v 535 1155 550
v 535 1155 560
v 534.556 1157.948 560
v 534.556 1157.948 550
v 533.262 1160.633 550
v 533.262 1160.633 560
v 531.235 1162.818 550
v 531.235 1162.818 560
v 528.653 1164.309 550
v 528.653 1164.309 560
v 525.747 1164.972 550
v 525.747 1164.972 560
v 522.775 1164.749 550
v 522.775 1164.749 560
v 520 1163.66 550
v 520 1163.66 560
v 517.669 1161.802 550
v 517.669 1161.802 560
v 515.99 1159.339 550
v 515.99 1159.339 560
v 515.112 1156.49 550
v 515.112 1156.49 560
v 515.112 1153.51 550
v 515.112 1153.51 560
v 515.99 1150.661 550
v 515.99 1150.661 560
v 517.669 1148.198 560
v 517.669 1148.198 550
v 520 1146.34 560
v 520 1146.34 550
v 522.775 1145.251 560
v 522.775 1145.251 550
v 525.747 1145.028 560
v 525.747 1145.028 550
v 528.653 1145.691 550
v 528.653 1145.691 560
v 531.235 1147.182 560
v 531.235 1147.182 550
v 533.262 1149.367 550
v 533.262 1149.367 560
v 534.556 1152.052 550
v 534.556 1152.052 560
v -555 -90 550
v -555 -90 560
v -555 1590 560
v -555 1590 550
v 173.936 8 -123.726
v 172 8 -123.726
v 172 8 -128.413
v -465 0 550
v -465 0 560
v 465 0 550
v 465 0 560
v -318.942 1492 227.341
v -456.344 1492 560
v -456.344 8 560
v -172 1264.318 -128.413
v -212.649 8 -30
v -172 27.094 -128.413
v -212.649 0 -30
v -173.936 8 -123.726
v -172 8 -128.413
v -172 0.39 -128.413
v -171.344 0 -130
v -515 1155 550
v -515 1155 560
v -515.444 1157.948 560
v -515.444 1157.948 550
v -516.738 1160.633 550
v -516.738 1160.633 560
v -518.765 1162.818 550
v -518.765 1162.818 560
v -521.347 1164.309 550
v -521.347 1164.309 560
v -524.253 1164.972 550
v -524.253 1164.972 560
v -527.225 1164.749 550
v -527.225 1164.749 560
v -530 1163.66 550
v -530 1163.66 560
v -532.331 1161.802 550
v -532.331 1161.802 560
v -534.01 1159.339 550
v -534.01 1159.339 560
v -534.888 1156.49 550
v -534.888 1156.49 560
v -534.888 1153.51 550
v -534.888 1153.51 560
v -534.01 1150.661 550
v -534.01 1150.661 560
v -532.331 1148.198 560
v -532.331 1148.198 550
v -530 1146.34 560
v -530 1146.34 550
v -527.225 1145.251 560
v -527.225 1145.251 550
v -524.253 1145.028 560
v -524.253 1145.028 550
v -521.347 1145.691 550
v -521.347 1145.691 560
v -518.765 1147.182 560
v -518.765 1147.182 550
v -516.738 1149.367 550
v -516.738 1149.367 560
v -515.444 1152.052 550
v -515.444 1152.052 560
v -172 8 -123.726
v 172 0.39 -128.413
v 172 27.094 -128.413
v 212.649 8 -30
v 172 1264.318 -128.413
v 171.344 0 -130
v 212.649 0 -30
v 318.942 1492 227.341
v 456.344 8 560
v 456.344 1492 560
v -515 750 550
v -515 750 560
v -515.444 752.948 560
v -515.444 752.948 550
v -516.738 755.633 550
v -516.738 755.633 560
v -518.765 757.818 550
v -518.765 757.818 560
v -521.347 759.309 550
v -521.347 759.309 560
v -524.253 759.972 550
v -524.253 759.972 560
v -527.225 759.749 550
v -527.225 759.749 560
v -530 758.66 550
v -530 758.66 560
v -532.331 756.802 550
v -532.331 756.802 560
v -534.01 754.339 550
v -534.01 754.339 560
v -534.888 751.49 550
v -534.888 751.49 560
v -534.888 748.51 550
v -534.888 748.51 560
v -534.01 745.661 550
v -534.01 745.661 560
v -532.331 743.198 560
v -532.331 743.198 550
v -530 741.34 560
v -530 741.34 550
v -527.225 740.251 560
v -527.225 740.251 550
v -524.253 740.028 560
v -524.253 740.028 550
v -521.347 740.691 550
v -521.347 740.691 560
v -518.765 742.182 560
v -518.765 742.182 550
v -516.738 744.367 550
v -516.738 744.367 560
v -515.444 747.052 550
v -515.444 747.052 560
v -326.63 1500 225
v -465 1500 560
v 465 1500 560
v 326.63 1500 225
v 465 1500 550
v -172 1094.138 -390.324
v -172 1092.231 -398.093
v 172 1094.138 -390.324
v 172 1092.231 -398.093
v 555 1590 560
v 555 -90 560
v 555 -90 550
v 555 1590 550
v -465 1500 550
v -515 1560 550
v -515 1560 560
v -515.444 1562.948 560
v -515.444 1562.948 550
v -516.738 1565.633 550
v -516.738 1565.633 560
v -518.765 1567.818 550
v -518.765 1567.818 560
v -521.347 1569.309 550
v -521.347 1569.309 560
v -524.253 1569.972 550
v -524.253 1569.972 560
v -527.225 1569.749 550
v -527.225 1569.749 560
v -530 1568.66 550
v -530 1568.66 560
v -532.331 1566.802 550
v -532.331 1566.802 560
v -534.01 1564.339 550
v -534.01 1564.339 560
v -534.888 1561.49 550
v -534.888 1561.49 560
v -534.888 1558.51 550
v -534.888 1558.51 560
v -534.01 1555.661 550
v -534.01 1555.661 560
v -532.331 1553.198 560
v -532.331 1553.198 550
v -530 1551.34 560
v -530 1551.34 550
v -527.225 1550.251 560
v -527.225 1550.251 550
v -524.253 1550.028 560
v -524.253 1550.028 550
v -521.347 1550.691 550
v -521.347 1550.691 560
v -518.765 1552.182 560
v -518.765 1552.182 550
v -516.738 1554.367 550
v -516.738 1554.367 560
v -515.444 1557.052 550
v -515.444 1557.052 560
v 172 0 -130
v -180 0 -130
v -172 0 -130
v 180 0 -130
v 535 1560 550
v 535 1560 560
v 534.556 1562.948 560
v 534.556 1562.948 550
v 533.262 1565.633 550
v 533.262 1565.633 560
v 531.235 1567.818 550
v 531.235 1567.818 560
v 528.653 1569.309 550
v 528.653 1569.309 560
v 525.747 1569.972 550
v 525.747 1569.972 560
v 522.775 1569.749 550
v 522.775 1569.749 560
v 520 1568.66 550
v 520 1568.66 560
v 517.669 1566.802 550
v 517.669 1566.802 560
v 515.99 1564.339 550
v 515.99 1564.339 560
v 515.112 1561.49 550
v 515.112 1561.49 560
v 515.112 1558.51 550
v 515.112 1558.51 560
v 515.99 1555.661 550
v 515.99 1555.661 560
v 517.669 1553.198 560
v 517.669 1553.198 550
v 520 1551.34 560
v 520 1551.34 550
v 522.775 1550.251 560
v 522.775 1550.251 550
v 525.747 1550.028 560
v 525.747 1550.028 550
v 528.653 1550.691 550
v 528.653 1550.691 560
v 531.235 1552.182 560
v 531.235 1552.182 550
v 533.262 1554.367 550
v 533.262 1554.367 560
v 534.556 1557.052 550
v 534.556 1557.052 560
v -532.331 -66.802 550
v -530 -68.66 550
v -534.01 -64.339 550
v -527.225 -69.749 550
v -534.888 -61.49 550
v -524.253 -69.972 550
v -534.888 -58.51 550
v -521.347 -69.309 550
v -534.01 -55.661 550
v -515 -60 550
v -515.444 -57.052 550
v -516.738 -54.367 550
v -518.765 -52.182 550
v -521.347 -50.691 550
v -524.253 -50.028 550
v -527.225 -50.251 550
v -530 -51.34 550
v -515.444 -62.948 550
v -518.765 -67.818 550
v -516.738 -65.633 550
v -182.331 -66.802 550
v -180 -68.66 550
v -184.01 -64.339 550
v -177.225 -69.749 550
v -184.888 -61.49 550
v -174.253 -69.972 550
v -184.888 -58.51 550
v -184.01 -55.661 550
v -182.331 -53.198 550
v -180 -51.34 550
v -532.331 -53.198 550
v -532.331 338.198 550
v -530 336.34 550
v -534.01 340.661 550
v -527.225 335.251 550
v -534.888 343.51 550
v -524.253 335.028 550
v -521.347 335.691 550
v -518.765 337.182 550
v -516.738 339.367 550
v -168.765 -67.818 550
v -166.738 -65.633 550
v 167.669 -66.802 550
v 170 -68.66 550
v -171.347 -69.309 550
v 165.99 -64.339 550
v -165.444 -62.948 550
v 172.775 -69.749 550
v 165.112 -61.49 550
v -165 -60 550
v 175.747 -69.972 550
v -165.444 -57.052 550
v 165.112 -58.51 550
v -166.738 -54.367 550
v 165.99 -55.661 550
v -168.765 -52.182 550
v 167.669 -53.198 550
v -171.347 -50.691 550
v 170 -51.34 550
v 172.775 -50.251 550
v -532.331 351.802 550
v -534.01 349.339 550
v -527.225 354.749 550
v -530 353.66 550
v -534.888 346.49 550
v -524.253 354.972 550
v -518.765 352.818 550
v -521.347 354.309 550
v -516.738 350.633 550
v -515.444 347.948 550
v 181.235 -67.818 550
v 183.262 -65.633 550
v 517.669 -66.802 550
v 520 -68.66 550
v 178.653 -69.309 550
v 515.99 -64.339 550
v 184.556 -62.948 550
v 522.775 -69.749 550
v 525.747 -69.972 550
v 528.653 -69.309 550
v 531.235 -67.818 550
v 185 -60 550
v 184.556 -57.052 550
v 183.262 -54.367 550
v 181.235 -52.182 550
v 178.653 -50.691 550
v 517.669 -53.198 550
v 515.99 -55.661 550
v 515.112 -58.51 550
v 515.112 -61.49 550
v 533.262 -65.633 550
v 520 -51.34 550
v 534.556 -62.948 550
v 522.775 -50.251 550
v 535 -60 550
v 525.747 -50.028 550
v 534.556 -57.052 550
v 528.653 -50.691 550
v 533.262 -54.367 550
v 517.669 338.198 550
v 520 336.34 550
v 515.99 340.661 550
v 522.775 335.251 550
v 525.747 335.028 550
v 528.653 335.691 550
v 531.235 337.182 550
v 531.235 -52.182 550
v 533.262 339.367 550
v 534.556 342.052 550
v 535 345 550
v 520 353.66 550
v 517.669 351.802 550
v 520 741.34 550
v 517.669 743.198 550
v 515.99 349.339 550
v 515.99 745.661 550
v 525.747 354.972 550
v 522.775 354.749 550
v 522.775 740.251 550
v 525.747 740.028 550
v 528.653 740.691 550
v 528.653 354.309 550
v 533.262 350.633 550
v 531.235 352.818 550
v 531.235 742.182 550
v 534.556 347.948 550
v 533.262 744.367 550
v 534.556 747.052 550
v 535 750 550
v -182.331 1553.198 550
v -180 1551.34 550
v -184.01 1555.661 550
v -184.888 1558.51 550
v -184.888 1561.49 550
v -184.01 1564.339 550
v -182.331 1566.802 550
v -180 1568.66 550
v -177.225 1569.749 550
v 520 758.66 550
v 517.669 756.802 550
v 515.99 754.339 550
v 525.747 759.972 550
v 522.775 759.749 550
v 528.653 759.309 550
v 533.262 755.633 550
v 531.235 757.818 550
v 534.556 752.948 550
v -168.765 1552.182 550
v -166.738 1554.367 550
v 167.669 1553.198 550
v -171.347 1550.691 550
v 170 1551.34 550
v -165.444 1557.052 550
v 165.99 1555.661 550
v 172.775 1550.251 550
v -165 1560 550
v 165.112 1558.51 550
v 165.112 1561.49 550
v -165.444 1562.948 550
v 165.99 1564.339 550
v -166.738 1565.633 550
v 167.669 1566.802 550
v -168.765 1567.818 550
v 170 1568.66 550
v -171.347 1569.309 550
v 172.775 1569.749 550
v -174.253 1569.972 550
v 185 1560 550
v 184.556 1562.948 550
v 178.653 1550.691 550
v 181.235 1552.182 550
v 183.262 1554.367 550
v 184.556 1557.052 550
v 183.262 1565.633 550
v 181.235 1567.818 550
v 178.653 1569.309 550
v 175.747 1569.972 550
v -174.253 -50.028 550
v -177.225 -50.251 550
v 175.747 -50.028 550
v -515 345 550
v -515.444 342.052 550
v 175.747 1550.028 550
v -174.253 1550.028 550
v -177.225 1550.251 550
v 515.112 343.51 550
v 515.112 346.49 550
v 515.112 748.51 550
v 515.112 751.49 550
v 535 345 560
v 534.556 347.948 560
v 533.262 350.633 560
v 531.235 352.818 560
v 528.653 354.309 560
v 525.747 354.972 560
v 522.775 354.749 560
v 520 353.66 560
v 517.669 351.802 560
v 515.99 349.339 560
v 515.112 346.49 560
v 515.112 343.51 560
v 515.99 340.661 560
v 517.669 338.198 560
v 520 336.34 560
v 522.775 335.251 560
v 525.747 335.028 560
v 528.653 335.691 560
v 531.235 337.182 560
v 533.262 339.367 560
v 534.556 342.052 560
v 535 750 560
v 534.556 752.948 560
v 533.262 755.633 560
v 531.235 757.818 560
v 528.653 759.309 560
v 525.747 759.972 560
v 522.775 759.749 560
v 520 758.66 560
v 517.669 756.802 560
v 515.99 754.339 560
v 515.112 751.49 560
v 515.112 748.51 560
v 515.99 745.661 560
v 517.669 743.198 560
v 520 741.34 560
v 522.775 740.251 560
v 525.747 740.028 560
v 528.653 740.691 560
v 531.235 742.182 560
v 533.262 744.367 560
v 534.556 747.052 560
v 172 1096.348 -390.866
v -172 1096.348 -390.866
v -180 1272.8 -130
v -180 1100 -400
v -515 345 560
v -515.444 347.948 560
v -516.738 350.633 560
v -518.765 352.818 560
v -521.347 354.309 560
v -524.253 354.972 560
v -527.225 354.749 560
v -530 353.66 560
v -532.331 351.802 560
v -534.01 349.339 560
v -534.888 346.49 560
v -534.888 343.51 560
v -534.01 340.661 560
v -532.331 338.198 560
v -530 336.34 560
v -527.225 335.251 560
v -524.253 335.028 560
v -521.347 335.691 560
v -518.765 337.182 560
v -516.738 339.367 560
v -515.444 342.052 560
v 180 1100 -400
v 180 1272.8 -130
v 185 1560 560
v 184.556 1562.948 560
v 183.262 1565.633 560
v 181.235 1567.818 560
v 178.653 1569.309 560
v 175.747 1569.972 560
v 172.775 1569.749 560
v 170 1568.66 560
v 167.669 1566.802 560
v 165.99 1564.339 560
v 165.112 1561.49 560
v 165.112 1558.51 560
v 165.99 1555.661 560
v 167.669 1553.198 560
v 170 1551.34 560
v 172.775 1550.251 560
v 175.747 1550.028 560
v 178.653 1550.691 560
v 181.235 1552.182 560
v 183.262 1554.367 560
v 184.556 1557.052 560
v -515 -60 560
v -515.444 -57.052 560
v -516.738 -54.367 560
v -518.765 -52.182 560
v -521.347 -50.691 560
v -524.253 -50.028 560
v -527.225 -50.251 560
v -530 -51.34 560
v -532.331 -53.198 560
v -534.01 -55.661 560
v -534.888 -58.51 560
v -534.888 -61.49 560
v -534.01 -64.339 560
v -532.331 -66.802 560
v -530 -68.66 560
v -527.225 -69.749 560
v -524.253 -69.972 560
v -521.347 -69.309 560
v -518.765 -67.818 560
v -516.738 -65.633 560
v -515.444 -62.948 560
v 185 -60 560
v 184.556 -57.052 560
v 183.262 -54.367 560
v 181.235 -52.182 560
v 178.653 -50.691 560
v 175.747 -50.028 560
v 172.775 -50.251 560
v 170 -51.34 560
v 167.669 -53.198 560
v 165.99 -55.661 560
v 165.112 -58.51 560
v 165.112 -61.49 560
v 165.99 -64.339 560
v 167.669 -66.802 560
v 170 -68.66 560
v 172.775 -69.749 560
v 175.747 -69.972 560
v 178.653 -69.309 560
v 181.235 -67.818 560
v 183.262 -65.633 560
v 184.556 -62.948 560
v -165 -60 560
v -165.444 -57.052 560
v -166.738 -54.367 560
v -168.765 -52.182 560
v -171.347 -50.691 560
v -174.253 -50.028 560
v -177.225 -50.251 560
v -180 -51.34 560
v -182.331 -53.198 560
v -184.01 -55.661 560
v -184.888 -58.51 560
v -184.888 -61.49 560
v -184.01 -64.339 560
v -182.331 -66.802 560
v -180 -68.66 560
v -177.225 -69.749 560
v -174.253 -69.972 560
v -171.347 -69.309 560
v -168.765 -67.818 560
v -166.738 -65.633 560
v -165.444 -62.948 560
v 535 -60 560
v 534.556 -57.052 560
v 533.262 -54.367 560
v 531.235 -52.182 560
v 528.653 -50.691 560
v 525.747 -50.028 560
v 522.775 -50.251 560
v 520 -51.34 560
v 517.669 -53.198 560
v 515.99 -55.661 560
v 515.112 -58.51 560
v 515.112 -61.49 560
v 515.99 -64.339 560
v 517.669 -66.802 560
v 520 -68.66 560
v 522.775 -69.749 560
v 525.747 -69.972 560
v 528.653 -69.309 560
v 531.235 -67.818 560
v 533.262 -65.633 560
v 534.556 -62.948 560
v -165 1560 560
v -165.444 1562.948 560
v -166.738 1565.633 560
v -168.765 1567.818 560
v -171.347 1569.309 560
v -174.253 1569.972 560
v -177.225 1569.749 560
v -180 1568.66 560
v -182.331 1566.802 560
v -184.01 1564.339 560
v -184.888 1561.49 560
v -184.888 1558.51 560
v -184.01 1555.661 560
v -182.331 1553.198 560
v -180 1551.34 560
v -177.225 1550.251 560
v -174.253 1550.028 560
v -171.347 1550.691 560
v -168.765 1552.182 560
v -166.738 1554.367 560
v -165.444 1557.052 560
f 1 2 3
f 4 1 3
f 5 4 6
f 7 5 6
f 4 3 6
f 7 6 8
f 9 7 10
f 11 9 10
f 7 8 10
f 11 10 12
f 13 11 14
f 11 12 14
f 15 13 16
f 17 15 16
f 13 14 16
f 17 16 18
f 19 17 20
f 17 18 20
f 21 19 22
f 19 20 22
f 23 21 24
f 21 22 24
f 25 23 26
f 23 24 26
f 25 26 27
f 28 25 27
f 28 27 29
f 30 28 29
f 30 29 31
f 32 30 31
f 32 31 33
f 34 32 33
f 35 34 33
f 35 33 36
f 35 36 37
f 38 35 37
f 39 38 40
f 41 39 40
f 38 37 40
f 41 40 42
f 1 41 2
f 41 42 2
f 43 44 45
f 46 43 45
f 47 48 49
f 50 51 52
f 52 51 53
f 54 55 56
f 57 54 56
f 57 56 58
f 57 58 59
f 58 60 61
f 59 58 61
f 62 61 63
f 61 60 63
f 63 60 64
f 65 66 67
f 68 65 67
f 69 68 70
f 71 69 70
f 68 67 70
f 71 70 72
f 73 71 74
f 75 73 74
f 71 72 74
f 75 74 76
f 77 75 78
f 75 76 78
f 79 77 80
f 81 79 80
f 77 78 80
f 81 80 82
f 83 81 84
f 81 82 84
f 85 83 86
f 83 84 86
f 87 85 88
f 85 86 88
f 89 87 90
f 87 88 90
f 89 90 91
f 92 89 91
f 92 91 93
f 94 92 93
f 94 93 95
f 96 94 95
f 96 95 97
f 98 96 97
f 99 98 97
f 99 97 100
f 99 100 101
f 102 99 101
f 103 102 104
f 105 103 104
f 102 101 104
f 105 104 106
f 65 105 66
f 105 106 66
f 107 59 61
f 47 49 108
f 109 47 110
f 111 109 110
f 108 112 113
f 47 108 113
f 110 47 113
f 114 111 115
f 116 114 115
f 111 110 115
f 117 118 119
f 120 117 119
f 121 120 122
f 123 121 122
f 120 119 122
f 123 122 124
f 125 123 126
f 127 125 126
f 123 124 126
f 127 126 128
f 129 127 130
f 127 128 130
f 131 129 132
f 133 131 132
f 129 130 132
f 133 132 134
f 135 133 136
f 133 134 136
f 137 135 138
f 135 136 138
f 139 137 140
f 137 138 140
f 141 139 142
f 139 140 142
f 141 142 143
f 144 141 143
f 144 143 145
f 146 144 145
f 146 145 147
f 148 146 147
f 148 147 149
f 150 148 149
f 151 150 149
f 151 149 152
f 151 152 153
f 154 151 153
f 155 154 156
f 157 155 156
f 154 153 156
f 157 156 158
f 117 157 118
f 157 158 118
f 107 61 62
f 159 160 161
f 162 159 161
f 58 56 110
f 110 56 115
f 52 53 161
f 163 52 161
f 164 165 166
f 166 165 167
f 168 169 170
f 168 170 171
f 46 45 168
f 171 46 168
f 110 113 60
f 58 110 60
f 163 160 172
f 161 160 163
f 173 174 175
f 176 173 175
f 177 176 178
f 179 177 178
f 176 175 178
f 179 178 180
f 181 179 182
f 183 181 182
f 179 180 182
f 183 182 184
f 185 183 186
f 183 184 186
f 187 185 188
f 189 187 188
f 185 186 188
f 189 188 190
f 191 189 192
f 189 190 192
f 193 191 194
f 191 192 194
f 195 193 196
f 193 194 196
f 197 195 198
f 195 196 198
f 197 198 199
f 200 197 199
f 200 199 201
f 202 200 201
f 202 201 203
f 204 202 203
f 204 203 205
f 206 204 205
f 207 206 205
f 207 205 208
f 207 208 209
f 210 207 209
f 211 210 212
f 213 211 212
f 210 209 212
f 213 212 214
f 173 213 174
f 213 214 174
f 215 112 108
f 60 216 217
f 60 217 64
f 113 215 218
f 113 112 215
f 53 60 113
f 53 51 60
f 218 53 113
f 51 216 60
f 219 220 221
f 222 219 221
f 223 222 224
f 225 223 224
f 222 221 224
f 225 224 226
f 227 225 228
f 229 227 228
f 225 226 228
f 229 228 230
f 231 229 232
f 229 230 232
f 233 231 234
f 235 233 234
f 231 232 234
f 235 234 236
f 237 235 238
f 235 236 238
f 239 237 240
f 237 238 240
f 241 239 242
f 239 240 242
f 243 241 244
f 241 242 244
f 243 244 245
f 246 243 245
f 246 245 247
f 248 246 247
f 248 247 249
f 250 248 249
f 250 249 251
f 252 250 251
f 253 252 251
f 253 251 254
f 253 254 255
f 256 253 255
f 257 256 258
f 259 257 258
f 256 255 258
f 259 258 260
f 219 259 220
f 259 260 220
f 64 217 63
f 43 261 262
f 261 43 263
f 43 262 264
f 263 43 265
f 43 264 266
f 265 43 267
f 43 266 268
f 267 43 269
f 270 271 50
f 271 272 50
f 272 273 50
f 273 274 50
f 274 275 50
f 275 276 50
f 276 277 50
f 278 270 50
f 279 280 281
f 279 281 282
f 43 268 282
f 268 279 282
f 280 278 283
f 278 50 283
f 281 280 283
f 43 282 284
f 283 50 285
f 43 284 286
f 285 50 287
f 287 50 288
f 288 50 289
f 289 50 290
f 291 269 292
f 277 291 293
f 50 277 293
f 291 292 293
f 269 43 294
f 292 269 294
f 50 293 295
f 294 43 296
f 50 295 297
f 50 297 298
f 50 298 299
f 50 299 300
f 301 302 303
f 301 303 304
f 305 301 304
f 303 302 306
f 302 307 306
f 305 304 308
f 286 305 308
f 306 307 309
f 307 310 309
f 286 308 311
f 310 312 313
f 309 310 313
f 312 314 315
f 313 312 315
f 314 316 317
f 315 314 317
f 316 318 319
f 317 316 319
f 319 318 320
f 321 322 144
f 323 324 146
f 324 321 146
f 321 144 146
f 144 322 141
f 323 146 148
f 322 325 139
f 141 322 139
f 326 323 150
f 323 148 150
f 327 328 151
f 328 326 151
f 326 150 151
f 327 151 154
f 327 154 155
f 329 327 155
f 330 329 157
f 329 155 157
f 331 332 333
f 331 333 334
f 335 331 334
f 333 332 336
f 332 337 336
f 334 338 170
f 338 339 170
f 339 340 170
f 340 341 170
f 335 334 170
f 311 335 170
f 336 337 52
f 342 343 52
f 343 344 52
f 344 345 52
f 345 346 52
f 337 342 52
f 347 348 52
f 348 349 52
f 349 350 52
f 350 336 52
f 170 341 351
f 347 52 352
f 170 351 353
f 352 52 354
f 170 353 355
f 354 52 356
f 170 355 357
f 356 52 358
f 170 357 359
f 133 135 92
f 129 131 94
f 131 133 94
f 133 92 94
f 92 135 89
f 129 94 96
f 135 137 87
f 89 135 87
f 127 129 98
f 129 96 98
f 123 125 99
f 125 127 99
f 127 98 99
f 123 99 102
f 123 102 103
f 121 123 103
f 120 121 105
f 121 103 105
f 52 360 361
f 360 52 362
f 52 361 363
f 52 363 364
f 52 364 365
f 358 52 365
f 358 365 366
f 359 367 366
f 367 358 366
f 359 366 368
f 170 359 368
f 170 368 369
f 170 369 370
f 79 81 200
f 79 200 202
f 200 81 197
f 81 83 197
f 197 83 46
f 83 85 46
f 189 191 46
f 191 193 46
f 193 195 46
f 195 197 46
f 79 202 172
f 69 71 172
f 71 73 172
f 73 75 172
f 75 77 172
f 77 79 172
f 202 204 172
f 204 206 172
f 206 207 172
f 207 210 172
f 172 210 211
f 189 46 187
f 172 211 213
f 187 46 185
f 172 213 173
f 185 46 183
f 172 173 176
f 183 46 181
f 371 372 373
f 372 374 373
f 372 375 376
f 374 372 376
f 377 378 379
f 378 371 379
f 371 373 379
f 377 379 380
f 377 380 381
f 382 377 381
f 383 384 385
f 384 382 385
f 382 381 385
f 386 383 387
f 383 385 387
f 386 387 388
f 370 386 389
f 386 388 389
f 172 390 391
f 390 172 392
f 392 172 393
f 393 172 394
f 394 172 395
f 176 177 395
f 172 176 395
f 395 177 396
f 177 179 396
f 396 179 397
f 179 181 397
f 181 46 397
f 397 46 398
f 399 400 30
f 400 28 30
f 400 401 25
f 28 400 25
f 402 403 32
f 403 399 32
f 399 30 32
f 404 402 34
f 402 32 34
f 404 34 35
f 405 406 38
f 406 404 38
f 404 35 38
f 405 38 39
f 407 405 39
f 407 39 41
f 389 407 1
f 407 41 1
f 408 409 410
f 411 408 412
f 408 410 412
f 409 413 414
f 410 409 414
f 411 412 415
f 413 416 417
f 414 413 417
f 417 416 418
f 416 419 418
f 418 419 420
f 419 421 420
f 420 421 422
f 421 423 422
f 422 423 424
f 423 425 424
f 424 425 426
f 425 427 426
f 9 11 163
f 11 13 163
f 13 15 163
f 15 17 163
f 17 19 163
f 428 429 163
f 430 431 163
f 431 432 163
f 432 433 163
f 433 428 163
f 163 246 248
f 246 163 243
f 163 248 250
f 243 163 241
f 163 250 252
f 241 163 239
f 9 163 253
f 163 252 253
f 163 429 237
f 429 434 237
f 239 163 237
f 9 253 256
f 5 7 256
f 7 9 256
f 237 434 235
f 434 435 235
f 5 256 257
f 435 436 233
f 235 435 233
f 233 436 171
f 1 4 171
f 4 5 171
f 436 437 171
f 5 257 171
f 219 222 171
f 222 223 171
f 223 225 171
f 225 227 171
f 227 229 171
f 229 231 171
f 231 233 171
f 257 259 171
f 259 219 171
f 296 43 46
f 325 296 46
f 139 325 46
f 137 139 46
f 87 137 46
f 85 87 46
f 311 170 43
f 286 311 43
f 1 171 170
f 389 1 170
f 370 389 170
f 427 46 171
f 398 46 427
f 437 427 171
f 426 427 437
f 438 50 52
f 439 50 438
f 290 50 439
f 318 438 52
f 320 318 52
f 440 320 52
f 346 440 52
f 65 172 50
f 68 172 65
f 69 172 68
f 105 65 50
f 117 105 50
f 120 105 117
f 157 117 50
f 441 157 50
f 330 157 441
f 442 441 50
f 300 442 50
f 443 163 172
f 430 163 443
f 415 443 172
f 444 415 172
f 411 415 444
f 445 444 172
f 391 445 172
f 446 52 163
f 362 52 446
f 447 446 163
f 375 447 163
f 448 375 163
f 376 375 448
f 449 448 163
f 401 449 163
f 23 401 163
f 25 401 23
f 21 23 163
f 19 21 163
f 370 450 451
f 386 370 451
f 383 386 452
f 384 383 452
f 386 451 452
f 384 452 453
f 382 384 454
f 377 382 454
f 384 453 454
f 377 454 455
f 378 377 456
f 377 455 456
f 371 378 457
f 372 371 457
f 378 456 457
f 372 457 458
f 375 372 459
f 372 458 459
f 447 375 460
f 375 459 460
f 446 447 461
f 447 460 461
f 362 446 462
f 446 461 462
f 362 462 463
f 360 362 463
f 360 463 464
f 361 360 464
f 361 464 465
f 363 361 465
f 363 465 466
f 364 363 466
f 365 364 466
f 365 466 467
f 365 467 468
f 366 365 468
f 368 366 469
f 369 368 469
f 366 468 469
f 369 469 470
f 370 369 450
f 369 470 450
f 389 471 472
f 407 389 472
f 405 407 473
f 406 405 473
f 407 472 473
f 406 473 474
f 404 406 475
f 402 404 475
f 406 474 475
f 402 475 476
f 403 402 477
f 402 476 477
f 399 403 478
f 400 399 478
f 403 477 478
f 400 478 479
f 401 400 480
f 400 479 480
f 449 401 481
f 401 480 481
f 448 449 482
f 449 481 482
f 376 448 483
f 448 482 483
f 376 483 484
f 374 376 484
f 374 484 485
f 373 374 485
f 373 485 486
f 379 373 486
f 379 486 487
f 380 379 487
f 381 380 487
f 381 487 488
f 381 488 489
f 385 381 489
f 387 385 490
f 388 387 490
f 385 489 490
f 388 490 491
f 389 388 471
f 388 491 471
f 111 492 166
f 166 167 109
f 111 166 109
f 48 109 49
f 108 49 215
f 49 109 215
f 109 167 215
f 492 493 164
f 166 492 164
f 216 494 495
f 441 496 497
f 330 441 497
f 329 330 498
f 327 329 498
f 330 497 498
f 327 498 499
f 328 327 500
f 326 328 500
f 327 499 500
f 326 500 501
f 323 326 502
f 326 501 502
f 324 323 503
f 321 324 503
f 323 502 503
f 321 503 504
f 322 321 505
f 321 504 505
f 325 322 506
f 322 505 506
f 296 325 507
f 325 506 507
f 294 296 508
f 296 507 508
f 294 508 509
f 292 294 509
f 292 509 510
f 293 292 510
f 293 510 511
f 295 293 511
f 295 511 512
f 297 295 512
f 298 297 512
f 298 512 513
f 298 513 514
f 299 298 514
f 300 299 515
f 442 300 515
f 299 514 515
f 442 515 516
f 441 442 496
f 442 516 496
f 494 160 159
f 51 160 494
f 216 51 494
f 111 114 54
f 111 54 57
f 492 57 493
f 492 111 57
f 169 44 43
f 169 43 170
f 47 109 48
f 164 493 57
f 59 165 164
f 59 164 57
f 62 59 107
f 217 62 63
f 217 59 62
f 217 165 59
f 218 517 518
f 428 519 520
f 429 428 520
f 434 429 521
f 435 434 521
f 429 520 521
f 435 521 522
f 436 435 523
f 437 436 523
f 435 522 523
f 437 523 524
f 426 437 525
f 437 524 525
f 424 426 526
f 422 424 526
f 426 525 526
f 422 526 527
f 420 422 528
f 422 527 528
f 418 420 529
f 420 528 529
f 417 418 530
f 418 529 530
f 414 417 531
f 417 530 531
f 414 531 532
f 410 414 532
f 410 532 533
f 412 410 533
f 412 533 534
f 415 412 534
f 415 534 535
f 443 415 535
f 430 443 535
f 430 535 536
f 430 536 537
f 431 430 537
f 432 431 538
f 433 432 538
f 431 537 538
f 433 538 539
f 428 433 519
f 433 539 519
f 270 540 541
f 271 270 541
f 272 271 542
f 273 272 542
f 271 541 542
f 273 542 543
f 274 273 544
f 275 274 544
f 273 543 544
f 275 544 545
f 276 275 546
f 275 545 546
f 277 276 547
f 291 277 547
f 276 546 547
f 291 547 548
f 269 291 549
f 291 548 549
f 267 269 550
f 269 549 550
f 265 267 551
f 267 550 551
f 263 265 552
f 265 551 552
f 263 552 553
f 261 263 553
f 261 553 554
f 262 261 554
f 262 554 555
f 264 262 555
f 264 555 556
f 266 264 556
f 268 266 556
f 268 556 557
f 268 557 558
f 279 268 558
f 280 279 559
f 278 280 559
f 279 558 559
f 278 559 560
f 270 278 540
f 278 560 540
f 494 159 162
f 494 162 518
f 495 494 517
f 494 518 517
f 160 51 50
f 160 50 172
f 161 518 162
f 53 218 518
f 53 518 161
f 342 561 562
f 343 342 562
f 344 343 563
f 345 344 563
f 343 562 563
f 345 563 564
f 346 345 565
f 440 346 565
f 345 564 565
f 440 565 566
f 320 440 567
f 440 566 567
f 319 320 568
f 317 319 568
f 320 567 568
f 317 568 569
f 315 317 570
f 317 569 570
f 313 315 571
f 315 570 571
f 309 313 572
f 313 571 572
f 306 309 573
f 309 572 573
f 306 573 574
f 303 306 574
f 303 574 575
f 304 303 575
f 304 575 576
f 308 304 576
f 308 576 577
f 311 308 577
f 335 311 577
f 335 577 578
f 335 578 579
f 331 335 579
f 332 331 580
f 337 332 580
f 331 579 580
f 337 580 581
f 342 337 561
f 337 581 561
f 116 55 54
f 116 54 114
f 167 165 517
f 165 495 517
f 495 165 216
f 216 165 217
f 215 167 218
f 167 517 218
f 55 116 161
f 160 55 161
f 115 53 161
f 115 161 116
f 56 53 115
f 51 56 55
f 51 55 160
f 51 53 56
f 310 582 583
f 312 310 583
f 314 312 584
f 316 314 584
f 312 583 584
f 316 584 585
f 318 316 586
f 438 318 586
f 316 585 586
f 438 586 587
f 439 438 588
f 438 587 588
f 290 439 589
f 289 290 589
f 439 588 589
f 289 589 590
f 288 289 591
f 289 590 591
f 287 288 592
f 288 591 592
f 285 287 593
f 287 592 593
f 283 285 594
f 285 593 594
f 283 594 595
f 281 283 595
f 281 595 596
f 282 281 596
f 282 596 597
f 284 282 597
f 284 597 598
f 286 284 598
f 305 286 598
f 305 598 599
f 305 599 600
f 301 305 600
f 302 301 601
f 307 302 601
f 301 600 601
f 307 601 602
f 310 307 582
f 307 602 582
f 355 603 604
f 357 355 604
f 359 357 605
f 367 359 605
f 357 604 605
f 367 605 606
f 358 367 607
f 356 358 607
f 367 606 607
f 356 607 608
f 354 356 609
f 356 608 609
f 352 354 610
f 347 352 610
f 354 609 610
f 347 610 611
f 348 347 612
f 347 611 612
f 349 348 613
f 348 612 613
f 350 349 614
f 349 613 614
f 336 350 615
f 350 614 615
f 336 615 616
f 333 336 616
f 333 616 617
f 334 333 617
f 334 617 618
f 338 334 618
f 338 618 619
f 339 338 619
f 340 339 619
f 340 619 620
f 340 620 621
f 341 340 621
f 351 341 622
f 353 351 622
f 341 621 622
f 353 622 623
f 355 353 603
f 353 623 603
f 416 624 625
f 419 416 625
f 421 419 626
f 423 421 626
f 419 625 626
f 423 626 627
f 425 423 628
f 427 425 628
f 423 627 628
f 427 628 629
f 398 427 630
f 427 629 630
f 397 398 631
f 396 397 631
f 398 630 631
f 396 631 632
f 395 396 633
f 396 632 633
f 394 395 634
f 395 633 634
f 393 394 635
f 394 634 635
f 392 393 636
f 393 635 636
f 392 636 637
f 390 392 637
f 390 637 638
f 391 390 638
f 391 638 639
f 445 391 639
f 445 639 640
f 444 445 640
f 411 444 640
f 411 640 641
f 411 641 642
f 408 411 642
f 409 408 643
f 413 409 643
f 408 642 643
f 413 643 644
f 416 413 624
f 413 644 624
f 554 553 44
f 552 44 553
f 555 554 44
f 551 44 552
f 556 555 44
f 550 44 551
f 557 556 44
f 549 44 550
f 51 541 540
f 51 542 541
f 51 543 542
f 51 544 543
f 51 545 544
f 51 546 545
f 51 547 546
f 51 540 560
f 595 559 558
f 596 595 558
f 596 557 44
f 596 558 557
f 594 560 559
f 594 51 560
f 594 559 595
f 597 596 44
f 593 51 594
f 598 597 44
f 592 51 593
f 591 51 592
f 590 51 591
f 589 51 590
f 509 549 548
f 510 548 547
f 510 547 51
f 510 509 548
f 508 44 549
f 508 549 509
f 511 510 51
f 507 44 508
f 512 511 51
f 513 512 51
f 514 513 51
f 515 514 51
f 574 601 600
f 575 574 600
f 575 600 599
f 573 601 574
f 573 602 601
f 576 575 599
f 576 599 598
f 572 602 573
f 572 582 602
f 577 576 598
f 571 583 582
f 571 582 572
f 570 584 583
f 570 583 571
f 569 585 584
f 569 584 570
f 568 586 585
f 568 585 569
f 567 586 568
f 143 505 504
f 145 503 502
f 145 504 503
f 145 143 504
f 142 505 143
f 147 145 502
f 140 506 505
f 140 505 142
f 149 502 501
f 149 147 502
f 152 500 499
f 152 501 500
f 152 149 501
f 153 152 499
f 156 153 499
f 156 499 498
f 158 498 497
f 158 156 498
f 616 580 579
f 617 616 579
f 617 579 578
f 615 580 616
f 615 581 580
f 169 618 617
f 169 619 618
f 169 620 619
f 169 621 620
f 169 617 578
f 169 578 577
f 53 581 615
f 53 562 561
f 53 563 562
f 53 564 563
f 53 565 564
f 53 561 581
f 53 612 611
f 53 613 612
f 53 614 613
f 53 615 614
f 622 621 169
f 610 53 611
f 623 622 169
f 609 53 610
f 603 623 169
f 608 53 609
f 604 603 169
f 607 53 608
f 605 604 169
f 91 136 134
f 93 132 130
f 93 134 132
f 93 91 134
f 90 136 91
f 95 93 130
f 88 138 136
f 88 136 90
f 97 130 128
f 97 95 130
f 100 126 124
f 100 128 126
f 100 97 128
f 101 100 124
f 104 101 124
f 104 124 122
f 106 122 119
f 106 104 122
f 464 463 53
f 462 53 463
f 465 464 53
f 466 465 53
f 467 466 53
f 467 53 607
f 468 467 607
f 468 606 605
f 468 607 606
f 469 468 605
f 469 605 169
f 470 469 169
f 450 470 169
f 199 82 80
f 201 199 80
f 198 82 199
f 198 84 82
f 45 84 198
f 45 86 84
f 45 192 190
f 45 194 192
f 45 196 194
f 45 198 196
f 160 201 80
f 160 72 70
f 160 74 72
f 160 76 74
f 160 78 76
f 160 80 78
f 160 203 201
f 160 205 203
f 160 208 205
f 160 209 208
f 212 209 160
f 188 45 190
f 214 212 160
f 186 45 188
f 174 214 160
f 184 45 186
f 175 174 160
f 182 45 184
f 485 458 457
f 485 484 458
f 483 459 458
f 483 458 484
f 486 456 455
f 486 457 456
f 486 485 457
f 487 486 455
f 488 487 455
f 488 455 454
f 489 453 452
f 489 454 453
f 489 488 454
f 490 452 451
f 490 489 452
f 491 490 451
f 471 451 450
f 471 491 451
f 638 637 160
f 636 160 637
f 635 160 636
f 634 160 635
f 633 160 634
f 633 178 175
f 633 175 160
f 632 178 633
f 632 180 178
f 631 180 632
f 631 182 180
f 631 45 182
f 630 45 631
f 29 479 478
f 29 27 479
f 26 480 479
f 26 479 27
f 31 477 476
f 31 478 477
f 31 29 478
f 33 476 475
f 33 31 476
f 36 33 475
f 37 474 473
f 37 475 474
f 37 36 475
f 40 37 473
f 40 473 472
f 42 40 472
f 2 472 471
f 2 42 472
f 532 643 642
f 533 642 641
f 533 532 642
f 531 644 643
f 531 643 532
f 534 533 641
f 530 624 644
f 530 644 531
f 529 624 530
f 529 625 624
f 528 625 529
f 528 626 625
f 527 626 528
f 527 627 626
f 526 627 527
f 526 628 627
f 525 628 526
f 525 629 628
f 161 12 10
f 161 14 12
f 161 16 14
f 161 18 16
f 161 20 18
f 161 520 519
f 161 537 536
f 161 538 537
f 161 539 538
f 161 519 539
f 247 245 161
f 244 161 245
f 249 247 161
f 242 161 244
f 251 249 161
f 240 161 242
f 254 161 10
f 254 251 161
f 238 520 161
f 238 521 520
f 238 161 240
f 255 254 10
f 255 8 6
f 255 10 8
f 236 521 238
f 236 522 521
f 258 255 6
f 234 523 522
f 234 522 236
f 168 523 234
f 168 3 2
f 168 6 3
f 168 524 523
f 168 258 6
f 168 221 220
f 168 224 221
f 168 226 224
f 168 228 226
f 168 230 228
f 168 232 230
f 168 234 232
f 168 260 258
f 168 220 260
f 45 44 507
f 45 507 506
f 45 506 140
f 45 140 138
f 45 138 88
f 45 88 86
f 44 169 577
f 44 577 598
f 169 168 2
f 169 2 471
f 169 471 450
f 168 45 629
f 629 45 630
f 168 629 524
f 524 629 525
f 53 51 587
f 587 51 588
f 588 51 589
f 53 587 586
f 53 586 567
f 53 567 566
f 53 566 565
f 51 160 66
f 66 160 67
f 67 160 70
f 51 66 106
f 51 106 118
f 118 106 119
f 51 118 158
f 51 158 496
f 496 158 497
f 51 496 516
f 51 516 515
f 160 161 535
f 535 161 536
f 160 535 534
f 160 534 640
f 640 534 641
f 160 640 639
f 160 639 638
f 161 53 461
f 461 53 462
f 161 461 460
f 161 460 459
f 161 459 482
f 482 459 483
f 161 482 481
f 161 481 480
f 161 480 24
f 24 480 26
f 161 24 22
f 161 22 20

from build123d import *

# Parameters (mm, degrees)
F1_DEPTH  = 1500
F2_W      = 1110
F2_H      = 1680
F2_W_2    = 930
F2_H_2    = 1500
F3_DEPTH  = 10
F4_R      = 10
F5_DEPTH  = 10
F7_DEPTH  = 1110.001
F8_T      = -8
F10_DEPTH = 8
F11_W     = 344
F11_H     = 1124.6517558367
F12_DEPTH = 8


with BuildPart() as f1:
    # F0 (on Front) → F1 (new body)
    with BuildSketch(Plane.XZ):
        Polygon((465, 560), (-465, 560), (-180, -130), (-180, -400), (180, -400), (180, -130), align=None)
    extrude(amount=-F1_DEPTH)

    # F6 (on face) → F7 (cut, through all)
    with BuildSketch(Plane.YZ.offset(555)):
        Polygon((0, -400), (1100, -400), (0, -130), align=None)
        Polygon((1500, 225), (1100, -400), (1500, -400), align=None)
    extrude(amount=-F7_DEPTH, mode=Mode.SUBTRACT)

    # F8
    f8_openings = [f1.faces().sort_by_distance(p)[0] for p in [
        (0, 750, 560),
    ]]
    offset(amount=F8_T, openings=f8_openings, kind=Kind.INTERSECTION)

    # F9 (on Front) → F10 (cut)
    with BuildSketch(Plane.XZ):
        Polygon((212.6487880778, -30), (-212.6487880778, -30), (-171.3444402517, -130), (171.3444402517, -130), align=None)
    extrude(amount=-F10_DEPTH, mode=Mode.SUBTRACT)

    # F11 (on face) → F12 (cut)
    with BuildSketch(Plane(origin=(0, -30.0958765297, -122.6128303063), x_dir=(1, 0, 0), z_dir=(0, -0.2383786531, -0.9711722905))):
        with Locations((0, -593.3151028228)):
            Rectangle(F11_W, F11_H)
    extrude(amount=-F12_DEPTH, mode=Mode.SUBTRACT)


with BuildPart() as f3:
    # F2 (on face) → F3 (new body)
    with BuildSketch(Plane.XY.offset(560)):
        with Locations((0, 750)):
            Rectangle(F2_W, F2_H)
        with Locations((0, 750)):
            Rectangle(F2_W_2, F2_H_2, mode=Mode.SUBTRACT)
    extrude(amount=-F3_DEPTH)

    # F4 (on face) → F5 (cut)
    with BuildSketch(Plane.XY.offset(560)):
        with Locations((-525, 1560)):
            Circle(F4_R)
        with Locations((-175, 1560)):
            Circle(F4_R)
        with Locations((175, 1560)):
            Circle(F4_R)
        with Locations((525, 1560)):
            Circle(F4_R)
        with Locations((525, 1155)):
            Circle(F4_R)
        with Locations((525, 750)):
            Circle(F4_R)
        with Locations((525, 345)):
            Circle(F4_R)
        with Locations((525, -60)):
            Circle(F4_R)
        with Locations((-525, 1155)):
            Circle(F4_R)
        with Locations((-525, 750)):
            Circle(F4_R)
        with Locations((-525, 345)):
            Circle(F4_R)
        with Locations((-525, -60)):
            Circle(F4_R)
        with Locations((175, -60)):
            Circle(F4_R)
        with Locations((-175, -60)):
            Circle(F4_R)
    extrude(amount=-F5_DEPTH, mode=Mode.SUBTRACT)


solid = Compound([f1.part, f3.part])
